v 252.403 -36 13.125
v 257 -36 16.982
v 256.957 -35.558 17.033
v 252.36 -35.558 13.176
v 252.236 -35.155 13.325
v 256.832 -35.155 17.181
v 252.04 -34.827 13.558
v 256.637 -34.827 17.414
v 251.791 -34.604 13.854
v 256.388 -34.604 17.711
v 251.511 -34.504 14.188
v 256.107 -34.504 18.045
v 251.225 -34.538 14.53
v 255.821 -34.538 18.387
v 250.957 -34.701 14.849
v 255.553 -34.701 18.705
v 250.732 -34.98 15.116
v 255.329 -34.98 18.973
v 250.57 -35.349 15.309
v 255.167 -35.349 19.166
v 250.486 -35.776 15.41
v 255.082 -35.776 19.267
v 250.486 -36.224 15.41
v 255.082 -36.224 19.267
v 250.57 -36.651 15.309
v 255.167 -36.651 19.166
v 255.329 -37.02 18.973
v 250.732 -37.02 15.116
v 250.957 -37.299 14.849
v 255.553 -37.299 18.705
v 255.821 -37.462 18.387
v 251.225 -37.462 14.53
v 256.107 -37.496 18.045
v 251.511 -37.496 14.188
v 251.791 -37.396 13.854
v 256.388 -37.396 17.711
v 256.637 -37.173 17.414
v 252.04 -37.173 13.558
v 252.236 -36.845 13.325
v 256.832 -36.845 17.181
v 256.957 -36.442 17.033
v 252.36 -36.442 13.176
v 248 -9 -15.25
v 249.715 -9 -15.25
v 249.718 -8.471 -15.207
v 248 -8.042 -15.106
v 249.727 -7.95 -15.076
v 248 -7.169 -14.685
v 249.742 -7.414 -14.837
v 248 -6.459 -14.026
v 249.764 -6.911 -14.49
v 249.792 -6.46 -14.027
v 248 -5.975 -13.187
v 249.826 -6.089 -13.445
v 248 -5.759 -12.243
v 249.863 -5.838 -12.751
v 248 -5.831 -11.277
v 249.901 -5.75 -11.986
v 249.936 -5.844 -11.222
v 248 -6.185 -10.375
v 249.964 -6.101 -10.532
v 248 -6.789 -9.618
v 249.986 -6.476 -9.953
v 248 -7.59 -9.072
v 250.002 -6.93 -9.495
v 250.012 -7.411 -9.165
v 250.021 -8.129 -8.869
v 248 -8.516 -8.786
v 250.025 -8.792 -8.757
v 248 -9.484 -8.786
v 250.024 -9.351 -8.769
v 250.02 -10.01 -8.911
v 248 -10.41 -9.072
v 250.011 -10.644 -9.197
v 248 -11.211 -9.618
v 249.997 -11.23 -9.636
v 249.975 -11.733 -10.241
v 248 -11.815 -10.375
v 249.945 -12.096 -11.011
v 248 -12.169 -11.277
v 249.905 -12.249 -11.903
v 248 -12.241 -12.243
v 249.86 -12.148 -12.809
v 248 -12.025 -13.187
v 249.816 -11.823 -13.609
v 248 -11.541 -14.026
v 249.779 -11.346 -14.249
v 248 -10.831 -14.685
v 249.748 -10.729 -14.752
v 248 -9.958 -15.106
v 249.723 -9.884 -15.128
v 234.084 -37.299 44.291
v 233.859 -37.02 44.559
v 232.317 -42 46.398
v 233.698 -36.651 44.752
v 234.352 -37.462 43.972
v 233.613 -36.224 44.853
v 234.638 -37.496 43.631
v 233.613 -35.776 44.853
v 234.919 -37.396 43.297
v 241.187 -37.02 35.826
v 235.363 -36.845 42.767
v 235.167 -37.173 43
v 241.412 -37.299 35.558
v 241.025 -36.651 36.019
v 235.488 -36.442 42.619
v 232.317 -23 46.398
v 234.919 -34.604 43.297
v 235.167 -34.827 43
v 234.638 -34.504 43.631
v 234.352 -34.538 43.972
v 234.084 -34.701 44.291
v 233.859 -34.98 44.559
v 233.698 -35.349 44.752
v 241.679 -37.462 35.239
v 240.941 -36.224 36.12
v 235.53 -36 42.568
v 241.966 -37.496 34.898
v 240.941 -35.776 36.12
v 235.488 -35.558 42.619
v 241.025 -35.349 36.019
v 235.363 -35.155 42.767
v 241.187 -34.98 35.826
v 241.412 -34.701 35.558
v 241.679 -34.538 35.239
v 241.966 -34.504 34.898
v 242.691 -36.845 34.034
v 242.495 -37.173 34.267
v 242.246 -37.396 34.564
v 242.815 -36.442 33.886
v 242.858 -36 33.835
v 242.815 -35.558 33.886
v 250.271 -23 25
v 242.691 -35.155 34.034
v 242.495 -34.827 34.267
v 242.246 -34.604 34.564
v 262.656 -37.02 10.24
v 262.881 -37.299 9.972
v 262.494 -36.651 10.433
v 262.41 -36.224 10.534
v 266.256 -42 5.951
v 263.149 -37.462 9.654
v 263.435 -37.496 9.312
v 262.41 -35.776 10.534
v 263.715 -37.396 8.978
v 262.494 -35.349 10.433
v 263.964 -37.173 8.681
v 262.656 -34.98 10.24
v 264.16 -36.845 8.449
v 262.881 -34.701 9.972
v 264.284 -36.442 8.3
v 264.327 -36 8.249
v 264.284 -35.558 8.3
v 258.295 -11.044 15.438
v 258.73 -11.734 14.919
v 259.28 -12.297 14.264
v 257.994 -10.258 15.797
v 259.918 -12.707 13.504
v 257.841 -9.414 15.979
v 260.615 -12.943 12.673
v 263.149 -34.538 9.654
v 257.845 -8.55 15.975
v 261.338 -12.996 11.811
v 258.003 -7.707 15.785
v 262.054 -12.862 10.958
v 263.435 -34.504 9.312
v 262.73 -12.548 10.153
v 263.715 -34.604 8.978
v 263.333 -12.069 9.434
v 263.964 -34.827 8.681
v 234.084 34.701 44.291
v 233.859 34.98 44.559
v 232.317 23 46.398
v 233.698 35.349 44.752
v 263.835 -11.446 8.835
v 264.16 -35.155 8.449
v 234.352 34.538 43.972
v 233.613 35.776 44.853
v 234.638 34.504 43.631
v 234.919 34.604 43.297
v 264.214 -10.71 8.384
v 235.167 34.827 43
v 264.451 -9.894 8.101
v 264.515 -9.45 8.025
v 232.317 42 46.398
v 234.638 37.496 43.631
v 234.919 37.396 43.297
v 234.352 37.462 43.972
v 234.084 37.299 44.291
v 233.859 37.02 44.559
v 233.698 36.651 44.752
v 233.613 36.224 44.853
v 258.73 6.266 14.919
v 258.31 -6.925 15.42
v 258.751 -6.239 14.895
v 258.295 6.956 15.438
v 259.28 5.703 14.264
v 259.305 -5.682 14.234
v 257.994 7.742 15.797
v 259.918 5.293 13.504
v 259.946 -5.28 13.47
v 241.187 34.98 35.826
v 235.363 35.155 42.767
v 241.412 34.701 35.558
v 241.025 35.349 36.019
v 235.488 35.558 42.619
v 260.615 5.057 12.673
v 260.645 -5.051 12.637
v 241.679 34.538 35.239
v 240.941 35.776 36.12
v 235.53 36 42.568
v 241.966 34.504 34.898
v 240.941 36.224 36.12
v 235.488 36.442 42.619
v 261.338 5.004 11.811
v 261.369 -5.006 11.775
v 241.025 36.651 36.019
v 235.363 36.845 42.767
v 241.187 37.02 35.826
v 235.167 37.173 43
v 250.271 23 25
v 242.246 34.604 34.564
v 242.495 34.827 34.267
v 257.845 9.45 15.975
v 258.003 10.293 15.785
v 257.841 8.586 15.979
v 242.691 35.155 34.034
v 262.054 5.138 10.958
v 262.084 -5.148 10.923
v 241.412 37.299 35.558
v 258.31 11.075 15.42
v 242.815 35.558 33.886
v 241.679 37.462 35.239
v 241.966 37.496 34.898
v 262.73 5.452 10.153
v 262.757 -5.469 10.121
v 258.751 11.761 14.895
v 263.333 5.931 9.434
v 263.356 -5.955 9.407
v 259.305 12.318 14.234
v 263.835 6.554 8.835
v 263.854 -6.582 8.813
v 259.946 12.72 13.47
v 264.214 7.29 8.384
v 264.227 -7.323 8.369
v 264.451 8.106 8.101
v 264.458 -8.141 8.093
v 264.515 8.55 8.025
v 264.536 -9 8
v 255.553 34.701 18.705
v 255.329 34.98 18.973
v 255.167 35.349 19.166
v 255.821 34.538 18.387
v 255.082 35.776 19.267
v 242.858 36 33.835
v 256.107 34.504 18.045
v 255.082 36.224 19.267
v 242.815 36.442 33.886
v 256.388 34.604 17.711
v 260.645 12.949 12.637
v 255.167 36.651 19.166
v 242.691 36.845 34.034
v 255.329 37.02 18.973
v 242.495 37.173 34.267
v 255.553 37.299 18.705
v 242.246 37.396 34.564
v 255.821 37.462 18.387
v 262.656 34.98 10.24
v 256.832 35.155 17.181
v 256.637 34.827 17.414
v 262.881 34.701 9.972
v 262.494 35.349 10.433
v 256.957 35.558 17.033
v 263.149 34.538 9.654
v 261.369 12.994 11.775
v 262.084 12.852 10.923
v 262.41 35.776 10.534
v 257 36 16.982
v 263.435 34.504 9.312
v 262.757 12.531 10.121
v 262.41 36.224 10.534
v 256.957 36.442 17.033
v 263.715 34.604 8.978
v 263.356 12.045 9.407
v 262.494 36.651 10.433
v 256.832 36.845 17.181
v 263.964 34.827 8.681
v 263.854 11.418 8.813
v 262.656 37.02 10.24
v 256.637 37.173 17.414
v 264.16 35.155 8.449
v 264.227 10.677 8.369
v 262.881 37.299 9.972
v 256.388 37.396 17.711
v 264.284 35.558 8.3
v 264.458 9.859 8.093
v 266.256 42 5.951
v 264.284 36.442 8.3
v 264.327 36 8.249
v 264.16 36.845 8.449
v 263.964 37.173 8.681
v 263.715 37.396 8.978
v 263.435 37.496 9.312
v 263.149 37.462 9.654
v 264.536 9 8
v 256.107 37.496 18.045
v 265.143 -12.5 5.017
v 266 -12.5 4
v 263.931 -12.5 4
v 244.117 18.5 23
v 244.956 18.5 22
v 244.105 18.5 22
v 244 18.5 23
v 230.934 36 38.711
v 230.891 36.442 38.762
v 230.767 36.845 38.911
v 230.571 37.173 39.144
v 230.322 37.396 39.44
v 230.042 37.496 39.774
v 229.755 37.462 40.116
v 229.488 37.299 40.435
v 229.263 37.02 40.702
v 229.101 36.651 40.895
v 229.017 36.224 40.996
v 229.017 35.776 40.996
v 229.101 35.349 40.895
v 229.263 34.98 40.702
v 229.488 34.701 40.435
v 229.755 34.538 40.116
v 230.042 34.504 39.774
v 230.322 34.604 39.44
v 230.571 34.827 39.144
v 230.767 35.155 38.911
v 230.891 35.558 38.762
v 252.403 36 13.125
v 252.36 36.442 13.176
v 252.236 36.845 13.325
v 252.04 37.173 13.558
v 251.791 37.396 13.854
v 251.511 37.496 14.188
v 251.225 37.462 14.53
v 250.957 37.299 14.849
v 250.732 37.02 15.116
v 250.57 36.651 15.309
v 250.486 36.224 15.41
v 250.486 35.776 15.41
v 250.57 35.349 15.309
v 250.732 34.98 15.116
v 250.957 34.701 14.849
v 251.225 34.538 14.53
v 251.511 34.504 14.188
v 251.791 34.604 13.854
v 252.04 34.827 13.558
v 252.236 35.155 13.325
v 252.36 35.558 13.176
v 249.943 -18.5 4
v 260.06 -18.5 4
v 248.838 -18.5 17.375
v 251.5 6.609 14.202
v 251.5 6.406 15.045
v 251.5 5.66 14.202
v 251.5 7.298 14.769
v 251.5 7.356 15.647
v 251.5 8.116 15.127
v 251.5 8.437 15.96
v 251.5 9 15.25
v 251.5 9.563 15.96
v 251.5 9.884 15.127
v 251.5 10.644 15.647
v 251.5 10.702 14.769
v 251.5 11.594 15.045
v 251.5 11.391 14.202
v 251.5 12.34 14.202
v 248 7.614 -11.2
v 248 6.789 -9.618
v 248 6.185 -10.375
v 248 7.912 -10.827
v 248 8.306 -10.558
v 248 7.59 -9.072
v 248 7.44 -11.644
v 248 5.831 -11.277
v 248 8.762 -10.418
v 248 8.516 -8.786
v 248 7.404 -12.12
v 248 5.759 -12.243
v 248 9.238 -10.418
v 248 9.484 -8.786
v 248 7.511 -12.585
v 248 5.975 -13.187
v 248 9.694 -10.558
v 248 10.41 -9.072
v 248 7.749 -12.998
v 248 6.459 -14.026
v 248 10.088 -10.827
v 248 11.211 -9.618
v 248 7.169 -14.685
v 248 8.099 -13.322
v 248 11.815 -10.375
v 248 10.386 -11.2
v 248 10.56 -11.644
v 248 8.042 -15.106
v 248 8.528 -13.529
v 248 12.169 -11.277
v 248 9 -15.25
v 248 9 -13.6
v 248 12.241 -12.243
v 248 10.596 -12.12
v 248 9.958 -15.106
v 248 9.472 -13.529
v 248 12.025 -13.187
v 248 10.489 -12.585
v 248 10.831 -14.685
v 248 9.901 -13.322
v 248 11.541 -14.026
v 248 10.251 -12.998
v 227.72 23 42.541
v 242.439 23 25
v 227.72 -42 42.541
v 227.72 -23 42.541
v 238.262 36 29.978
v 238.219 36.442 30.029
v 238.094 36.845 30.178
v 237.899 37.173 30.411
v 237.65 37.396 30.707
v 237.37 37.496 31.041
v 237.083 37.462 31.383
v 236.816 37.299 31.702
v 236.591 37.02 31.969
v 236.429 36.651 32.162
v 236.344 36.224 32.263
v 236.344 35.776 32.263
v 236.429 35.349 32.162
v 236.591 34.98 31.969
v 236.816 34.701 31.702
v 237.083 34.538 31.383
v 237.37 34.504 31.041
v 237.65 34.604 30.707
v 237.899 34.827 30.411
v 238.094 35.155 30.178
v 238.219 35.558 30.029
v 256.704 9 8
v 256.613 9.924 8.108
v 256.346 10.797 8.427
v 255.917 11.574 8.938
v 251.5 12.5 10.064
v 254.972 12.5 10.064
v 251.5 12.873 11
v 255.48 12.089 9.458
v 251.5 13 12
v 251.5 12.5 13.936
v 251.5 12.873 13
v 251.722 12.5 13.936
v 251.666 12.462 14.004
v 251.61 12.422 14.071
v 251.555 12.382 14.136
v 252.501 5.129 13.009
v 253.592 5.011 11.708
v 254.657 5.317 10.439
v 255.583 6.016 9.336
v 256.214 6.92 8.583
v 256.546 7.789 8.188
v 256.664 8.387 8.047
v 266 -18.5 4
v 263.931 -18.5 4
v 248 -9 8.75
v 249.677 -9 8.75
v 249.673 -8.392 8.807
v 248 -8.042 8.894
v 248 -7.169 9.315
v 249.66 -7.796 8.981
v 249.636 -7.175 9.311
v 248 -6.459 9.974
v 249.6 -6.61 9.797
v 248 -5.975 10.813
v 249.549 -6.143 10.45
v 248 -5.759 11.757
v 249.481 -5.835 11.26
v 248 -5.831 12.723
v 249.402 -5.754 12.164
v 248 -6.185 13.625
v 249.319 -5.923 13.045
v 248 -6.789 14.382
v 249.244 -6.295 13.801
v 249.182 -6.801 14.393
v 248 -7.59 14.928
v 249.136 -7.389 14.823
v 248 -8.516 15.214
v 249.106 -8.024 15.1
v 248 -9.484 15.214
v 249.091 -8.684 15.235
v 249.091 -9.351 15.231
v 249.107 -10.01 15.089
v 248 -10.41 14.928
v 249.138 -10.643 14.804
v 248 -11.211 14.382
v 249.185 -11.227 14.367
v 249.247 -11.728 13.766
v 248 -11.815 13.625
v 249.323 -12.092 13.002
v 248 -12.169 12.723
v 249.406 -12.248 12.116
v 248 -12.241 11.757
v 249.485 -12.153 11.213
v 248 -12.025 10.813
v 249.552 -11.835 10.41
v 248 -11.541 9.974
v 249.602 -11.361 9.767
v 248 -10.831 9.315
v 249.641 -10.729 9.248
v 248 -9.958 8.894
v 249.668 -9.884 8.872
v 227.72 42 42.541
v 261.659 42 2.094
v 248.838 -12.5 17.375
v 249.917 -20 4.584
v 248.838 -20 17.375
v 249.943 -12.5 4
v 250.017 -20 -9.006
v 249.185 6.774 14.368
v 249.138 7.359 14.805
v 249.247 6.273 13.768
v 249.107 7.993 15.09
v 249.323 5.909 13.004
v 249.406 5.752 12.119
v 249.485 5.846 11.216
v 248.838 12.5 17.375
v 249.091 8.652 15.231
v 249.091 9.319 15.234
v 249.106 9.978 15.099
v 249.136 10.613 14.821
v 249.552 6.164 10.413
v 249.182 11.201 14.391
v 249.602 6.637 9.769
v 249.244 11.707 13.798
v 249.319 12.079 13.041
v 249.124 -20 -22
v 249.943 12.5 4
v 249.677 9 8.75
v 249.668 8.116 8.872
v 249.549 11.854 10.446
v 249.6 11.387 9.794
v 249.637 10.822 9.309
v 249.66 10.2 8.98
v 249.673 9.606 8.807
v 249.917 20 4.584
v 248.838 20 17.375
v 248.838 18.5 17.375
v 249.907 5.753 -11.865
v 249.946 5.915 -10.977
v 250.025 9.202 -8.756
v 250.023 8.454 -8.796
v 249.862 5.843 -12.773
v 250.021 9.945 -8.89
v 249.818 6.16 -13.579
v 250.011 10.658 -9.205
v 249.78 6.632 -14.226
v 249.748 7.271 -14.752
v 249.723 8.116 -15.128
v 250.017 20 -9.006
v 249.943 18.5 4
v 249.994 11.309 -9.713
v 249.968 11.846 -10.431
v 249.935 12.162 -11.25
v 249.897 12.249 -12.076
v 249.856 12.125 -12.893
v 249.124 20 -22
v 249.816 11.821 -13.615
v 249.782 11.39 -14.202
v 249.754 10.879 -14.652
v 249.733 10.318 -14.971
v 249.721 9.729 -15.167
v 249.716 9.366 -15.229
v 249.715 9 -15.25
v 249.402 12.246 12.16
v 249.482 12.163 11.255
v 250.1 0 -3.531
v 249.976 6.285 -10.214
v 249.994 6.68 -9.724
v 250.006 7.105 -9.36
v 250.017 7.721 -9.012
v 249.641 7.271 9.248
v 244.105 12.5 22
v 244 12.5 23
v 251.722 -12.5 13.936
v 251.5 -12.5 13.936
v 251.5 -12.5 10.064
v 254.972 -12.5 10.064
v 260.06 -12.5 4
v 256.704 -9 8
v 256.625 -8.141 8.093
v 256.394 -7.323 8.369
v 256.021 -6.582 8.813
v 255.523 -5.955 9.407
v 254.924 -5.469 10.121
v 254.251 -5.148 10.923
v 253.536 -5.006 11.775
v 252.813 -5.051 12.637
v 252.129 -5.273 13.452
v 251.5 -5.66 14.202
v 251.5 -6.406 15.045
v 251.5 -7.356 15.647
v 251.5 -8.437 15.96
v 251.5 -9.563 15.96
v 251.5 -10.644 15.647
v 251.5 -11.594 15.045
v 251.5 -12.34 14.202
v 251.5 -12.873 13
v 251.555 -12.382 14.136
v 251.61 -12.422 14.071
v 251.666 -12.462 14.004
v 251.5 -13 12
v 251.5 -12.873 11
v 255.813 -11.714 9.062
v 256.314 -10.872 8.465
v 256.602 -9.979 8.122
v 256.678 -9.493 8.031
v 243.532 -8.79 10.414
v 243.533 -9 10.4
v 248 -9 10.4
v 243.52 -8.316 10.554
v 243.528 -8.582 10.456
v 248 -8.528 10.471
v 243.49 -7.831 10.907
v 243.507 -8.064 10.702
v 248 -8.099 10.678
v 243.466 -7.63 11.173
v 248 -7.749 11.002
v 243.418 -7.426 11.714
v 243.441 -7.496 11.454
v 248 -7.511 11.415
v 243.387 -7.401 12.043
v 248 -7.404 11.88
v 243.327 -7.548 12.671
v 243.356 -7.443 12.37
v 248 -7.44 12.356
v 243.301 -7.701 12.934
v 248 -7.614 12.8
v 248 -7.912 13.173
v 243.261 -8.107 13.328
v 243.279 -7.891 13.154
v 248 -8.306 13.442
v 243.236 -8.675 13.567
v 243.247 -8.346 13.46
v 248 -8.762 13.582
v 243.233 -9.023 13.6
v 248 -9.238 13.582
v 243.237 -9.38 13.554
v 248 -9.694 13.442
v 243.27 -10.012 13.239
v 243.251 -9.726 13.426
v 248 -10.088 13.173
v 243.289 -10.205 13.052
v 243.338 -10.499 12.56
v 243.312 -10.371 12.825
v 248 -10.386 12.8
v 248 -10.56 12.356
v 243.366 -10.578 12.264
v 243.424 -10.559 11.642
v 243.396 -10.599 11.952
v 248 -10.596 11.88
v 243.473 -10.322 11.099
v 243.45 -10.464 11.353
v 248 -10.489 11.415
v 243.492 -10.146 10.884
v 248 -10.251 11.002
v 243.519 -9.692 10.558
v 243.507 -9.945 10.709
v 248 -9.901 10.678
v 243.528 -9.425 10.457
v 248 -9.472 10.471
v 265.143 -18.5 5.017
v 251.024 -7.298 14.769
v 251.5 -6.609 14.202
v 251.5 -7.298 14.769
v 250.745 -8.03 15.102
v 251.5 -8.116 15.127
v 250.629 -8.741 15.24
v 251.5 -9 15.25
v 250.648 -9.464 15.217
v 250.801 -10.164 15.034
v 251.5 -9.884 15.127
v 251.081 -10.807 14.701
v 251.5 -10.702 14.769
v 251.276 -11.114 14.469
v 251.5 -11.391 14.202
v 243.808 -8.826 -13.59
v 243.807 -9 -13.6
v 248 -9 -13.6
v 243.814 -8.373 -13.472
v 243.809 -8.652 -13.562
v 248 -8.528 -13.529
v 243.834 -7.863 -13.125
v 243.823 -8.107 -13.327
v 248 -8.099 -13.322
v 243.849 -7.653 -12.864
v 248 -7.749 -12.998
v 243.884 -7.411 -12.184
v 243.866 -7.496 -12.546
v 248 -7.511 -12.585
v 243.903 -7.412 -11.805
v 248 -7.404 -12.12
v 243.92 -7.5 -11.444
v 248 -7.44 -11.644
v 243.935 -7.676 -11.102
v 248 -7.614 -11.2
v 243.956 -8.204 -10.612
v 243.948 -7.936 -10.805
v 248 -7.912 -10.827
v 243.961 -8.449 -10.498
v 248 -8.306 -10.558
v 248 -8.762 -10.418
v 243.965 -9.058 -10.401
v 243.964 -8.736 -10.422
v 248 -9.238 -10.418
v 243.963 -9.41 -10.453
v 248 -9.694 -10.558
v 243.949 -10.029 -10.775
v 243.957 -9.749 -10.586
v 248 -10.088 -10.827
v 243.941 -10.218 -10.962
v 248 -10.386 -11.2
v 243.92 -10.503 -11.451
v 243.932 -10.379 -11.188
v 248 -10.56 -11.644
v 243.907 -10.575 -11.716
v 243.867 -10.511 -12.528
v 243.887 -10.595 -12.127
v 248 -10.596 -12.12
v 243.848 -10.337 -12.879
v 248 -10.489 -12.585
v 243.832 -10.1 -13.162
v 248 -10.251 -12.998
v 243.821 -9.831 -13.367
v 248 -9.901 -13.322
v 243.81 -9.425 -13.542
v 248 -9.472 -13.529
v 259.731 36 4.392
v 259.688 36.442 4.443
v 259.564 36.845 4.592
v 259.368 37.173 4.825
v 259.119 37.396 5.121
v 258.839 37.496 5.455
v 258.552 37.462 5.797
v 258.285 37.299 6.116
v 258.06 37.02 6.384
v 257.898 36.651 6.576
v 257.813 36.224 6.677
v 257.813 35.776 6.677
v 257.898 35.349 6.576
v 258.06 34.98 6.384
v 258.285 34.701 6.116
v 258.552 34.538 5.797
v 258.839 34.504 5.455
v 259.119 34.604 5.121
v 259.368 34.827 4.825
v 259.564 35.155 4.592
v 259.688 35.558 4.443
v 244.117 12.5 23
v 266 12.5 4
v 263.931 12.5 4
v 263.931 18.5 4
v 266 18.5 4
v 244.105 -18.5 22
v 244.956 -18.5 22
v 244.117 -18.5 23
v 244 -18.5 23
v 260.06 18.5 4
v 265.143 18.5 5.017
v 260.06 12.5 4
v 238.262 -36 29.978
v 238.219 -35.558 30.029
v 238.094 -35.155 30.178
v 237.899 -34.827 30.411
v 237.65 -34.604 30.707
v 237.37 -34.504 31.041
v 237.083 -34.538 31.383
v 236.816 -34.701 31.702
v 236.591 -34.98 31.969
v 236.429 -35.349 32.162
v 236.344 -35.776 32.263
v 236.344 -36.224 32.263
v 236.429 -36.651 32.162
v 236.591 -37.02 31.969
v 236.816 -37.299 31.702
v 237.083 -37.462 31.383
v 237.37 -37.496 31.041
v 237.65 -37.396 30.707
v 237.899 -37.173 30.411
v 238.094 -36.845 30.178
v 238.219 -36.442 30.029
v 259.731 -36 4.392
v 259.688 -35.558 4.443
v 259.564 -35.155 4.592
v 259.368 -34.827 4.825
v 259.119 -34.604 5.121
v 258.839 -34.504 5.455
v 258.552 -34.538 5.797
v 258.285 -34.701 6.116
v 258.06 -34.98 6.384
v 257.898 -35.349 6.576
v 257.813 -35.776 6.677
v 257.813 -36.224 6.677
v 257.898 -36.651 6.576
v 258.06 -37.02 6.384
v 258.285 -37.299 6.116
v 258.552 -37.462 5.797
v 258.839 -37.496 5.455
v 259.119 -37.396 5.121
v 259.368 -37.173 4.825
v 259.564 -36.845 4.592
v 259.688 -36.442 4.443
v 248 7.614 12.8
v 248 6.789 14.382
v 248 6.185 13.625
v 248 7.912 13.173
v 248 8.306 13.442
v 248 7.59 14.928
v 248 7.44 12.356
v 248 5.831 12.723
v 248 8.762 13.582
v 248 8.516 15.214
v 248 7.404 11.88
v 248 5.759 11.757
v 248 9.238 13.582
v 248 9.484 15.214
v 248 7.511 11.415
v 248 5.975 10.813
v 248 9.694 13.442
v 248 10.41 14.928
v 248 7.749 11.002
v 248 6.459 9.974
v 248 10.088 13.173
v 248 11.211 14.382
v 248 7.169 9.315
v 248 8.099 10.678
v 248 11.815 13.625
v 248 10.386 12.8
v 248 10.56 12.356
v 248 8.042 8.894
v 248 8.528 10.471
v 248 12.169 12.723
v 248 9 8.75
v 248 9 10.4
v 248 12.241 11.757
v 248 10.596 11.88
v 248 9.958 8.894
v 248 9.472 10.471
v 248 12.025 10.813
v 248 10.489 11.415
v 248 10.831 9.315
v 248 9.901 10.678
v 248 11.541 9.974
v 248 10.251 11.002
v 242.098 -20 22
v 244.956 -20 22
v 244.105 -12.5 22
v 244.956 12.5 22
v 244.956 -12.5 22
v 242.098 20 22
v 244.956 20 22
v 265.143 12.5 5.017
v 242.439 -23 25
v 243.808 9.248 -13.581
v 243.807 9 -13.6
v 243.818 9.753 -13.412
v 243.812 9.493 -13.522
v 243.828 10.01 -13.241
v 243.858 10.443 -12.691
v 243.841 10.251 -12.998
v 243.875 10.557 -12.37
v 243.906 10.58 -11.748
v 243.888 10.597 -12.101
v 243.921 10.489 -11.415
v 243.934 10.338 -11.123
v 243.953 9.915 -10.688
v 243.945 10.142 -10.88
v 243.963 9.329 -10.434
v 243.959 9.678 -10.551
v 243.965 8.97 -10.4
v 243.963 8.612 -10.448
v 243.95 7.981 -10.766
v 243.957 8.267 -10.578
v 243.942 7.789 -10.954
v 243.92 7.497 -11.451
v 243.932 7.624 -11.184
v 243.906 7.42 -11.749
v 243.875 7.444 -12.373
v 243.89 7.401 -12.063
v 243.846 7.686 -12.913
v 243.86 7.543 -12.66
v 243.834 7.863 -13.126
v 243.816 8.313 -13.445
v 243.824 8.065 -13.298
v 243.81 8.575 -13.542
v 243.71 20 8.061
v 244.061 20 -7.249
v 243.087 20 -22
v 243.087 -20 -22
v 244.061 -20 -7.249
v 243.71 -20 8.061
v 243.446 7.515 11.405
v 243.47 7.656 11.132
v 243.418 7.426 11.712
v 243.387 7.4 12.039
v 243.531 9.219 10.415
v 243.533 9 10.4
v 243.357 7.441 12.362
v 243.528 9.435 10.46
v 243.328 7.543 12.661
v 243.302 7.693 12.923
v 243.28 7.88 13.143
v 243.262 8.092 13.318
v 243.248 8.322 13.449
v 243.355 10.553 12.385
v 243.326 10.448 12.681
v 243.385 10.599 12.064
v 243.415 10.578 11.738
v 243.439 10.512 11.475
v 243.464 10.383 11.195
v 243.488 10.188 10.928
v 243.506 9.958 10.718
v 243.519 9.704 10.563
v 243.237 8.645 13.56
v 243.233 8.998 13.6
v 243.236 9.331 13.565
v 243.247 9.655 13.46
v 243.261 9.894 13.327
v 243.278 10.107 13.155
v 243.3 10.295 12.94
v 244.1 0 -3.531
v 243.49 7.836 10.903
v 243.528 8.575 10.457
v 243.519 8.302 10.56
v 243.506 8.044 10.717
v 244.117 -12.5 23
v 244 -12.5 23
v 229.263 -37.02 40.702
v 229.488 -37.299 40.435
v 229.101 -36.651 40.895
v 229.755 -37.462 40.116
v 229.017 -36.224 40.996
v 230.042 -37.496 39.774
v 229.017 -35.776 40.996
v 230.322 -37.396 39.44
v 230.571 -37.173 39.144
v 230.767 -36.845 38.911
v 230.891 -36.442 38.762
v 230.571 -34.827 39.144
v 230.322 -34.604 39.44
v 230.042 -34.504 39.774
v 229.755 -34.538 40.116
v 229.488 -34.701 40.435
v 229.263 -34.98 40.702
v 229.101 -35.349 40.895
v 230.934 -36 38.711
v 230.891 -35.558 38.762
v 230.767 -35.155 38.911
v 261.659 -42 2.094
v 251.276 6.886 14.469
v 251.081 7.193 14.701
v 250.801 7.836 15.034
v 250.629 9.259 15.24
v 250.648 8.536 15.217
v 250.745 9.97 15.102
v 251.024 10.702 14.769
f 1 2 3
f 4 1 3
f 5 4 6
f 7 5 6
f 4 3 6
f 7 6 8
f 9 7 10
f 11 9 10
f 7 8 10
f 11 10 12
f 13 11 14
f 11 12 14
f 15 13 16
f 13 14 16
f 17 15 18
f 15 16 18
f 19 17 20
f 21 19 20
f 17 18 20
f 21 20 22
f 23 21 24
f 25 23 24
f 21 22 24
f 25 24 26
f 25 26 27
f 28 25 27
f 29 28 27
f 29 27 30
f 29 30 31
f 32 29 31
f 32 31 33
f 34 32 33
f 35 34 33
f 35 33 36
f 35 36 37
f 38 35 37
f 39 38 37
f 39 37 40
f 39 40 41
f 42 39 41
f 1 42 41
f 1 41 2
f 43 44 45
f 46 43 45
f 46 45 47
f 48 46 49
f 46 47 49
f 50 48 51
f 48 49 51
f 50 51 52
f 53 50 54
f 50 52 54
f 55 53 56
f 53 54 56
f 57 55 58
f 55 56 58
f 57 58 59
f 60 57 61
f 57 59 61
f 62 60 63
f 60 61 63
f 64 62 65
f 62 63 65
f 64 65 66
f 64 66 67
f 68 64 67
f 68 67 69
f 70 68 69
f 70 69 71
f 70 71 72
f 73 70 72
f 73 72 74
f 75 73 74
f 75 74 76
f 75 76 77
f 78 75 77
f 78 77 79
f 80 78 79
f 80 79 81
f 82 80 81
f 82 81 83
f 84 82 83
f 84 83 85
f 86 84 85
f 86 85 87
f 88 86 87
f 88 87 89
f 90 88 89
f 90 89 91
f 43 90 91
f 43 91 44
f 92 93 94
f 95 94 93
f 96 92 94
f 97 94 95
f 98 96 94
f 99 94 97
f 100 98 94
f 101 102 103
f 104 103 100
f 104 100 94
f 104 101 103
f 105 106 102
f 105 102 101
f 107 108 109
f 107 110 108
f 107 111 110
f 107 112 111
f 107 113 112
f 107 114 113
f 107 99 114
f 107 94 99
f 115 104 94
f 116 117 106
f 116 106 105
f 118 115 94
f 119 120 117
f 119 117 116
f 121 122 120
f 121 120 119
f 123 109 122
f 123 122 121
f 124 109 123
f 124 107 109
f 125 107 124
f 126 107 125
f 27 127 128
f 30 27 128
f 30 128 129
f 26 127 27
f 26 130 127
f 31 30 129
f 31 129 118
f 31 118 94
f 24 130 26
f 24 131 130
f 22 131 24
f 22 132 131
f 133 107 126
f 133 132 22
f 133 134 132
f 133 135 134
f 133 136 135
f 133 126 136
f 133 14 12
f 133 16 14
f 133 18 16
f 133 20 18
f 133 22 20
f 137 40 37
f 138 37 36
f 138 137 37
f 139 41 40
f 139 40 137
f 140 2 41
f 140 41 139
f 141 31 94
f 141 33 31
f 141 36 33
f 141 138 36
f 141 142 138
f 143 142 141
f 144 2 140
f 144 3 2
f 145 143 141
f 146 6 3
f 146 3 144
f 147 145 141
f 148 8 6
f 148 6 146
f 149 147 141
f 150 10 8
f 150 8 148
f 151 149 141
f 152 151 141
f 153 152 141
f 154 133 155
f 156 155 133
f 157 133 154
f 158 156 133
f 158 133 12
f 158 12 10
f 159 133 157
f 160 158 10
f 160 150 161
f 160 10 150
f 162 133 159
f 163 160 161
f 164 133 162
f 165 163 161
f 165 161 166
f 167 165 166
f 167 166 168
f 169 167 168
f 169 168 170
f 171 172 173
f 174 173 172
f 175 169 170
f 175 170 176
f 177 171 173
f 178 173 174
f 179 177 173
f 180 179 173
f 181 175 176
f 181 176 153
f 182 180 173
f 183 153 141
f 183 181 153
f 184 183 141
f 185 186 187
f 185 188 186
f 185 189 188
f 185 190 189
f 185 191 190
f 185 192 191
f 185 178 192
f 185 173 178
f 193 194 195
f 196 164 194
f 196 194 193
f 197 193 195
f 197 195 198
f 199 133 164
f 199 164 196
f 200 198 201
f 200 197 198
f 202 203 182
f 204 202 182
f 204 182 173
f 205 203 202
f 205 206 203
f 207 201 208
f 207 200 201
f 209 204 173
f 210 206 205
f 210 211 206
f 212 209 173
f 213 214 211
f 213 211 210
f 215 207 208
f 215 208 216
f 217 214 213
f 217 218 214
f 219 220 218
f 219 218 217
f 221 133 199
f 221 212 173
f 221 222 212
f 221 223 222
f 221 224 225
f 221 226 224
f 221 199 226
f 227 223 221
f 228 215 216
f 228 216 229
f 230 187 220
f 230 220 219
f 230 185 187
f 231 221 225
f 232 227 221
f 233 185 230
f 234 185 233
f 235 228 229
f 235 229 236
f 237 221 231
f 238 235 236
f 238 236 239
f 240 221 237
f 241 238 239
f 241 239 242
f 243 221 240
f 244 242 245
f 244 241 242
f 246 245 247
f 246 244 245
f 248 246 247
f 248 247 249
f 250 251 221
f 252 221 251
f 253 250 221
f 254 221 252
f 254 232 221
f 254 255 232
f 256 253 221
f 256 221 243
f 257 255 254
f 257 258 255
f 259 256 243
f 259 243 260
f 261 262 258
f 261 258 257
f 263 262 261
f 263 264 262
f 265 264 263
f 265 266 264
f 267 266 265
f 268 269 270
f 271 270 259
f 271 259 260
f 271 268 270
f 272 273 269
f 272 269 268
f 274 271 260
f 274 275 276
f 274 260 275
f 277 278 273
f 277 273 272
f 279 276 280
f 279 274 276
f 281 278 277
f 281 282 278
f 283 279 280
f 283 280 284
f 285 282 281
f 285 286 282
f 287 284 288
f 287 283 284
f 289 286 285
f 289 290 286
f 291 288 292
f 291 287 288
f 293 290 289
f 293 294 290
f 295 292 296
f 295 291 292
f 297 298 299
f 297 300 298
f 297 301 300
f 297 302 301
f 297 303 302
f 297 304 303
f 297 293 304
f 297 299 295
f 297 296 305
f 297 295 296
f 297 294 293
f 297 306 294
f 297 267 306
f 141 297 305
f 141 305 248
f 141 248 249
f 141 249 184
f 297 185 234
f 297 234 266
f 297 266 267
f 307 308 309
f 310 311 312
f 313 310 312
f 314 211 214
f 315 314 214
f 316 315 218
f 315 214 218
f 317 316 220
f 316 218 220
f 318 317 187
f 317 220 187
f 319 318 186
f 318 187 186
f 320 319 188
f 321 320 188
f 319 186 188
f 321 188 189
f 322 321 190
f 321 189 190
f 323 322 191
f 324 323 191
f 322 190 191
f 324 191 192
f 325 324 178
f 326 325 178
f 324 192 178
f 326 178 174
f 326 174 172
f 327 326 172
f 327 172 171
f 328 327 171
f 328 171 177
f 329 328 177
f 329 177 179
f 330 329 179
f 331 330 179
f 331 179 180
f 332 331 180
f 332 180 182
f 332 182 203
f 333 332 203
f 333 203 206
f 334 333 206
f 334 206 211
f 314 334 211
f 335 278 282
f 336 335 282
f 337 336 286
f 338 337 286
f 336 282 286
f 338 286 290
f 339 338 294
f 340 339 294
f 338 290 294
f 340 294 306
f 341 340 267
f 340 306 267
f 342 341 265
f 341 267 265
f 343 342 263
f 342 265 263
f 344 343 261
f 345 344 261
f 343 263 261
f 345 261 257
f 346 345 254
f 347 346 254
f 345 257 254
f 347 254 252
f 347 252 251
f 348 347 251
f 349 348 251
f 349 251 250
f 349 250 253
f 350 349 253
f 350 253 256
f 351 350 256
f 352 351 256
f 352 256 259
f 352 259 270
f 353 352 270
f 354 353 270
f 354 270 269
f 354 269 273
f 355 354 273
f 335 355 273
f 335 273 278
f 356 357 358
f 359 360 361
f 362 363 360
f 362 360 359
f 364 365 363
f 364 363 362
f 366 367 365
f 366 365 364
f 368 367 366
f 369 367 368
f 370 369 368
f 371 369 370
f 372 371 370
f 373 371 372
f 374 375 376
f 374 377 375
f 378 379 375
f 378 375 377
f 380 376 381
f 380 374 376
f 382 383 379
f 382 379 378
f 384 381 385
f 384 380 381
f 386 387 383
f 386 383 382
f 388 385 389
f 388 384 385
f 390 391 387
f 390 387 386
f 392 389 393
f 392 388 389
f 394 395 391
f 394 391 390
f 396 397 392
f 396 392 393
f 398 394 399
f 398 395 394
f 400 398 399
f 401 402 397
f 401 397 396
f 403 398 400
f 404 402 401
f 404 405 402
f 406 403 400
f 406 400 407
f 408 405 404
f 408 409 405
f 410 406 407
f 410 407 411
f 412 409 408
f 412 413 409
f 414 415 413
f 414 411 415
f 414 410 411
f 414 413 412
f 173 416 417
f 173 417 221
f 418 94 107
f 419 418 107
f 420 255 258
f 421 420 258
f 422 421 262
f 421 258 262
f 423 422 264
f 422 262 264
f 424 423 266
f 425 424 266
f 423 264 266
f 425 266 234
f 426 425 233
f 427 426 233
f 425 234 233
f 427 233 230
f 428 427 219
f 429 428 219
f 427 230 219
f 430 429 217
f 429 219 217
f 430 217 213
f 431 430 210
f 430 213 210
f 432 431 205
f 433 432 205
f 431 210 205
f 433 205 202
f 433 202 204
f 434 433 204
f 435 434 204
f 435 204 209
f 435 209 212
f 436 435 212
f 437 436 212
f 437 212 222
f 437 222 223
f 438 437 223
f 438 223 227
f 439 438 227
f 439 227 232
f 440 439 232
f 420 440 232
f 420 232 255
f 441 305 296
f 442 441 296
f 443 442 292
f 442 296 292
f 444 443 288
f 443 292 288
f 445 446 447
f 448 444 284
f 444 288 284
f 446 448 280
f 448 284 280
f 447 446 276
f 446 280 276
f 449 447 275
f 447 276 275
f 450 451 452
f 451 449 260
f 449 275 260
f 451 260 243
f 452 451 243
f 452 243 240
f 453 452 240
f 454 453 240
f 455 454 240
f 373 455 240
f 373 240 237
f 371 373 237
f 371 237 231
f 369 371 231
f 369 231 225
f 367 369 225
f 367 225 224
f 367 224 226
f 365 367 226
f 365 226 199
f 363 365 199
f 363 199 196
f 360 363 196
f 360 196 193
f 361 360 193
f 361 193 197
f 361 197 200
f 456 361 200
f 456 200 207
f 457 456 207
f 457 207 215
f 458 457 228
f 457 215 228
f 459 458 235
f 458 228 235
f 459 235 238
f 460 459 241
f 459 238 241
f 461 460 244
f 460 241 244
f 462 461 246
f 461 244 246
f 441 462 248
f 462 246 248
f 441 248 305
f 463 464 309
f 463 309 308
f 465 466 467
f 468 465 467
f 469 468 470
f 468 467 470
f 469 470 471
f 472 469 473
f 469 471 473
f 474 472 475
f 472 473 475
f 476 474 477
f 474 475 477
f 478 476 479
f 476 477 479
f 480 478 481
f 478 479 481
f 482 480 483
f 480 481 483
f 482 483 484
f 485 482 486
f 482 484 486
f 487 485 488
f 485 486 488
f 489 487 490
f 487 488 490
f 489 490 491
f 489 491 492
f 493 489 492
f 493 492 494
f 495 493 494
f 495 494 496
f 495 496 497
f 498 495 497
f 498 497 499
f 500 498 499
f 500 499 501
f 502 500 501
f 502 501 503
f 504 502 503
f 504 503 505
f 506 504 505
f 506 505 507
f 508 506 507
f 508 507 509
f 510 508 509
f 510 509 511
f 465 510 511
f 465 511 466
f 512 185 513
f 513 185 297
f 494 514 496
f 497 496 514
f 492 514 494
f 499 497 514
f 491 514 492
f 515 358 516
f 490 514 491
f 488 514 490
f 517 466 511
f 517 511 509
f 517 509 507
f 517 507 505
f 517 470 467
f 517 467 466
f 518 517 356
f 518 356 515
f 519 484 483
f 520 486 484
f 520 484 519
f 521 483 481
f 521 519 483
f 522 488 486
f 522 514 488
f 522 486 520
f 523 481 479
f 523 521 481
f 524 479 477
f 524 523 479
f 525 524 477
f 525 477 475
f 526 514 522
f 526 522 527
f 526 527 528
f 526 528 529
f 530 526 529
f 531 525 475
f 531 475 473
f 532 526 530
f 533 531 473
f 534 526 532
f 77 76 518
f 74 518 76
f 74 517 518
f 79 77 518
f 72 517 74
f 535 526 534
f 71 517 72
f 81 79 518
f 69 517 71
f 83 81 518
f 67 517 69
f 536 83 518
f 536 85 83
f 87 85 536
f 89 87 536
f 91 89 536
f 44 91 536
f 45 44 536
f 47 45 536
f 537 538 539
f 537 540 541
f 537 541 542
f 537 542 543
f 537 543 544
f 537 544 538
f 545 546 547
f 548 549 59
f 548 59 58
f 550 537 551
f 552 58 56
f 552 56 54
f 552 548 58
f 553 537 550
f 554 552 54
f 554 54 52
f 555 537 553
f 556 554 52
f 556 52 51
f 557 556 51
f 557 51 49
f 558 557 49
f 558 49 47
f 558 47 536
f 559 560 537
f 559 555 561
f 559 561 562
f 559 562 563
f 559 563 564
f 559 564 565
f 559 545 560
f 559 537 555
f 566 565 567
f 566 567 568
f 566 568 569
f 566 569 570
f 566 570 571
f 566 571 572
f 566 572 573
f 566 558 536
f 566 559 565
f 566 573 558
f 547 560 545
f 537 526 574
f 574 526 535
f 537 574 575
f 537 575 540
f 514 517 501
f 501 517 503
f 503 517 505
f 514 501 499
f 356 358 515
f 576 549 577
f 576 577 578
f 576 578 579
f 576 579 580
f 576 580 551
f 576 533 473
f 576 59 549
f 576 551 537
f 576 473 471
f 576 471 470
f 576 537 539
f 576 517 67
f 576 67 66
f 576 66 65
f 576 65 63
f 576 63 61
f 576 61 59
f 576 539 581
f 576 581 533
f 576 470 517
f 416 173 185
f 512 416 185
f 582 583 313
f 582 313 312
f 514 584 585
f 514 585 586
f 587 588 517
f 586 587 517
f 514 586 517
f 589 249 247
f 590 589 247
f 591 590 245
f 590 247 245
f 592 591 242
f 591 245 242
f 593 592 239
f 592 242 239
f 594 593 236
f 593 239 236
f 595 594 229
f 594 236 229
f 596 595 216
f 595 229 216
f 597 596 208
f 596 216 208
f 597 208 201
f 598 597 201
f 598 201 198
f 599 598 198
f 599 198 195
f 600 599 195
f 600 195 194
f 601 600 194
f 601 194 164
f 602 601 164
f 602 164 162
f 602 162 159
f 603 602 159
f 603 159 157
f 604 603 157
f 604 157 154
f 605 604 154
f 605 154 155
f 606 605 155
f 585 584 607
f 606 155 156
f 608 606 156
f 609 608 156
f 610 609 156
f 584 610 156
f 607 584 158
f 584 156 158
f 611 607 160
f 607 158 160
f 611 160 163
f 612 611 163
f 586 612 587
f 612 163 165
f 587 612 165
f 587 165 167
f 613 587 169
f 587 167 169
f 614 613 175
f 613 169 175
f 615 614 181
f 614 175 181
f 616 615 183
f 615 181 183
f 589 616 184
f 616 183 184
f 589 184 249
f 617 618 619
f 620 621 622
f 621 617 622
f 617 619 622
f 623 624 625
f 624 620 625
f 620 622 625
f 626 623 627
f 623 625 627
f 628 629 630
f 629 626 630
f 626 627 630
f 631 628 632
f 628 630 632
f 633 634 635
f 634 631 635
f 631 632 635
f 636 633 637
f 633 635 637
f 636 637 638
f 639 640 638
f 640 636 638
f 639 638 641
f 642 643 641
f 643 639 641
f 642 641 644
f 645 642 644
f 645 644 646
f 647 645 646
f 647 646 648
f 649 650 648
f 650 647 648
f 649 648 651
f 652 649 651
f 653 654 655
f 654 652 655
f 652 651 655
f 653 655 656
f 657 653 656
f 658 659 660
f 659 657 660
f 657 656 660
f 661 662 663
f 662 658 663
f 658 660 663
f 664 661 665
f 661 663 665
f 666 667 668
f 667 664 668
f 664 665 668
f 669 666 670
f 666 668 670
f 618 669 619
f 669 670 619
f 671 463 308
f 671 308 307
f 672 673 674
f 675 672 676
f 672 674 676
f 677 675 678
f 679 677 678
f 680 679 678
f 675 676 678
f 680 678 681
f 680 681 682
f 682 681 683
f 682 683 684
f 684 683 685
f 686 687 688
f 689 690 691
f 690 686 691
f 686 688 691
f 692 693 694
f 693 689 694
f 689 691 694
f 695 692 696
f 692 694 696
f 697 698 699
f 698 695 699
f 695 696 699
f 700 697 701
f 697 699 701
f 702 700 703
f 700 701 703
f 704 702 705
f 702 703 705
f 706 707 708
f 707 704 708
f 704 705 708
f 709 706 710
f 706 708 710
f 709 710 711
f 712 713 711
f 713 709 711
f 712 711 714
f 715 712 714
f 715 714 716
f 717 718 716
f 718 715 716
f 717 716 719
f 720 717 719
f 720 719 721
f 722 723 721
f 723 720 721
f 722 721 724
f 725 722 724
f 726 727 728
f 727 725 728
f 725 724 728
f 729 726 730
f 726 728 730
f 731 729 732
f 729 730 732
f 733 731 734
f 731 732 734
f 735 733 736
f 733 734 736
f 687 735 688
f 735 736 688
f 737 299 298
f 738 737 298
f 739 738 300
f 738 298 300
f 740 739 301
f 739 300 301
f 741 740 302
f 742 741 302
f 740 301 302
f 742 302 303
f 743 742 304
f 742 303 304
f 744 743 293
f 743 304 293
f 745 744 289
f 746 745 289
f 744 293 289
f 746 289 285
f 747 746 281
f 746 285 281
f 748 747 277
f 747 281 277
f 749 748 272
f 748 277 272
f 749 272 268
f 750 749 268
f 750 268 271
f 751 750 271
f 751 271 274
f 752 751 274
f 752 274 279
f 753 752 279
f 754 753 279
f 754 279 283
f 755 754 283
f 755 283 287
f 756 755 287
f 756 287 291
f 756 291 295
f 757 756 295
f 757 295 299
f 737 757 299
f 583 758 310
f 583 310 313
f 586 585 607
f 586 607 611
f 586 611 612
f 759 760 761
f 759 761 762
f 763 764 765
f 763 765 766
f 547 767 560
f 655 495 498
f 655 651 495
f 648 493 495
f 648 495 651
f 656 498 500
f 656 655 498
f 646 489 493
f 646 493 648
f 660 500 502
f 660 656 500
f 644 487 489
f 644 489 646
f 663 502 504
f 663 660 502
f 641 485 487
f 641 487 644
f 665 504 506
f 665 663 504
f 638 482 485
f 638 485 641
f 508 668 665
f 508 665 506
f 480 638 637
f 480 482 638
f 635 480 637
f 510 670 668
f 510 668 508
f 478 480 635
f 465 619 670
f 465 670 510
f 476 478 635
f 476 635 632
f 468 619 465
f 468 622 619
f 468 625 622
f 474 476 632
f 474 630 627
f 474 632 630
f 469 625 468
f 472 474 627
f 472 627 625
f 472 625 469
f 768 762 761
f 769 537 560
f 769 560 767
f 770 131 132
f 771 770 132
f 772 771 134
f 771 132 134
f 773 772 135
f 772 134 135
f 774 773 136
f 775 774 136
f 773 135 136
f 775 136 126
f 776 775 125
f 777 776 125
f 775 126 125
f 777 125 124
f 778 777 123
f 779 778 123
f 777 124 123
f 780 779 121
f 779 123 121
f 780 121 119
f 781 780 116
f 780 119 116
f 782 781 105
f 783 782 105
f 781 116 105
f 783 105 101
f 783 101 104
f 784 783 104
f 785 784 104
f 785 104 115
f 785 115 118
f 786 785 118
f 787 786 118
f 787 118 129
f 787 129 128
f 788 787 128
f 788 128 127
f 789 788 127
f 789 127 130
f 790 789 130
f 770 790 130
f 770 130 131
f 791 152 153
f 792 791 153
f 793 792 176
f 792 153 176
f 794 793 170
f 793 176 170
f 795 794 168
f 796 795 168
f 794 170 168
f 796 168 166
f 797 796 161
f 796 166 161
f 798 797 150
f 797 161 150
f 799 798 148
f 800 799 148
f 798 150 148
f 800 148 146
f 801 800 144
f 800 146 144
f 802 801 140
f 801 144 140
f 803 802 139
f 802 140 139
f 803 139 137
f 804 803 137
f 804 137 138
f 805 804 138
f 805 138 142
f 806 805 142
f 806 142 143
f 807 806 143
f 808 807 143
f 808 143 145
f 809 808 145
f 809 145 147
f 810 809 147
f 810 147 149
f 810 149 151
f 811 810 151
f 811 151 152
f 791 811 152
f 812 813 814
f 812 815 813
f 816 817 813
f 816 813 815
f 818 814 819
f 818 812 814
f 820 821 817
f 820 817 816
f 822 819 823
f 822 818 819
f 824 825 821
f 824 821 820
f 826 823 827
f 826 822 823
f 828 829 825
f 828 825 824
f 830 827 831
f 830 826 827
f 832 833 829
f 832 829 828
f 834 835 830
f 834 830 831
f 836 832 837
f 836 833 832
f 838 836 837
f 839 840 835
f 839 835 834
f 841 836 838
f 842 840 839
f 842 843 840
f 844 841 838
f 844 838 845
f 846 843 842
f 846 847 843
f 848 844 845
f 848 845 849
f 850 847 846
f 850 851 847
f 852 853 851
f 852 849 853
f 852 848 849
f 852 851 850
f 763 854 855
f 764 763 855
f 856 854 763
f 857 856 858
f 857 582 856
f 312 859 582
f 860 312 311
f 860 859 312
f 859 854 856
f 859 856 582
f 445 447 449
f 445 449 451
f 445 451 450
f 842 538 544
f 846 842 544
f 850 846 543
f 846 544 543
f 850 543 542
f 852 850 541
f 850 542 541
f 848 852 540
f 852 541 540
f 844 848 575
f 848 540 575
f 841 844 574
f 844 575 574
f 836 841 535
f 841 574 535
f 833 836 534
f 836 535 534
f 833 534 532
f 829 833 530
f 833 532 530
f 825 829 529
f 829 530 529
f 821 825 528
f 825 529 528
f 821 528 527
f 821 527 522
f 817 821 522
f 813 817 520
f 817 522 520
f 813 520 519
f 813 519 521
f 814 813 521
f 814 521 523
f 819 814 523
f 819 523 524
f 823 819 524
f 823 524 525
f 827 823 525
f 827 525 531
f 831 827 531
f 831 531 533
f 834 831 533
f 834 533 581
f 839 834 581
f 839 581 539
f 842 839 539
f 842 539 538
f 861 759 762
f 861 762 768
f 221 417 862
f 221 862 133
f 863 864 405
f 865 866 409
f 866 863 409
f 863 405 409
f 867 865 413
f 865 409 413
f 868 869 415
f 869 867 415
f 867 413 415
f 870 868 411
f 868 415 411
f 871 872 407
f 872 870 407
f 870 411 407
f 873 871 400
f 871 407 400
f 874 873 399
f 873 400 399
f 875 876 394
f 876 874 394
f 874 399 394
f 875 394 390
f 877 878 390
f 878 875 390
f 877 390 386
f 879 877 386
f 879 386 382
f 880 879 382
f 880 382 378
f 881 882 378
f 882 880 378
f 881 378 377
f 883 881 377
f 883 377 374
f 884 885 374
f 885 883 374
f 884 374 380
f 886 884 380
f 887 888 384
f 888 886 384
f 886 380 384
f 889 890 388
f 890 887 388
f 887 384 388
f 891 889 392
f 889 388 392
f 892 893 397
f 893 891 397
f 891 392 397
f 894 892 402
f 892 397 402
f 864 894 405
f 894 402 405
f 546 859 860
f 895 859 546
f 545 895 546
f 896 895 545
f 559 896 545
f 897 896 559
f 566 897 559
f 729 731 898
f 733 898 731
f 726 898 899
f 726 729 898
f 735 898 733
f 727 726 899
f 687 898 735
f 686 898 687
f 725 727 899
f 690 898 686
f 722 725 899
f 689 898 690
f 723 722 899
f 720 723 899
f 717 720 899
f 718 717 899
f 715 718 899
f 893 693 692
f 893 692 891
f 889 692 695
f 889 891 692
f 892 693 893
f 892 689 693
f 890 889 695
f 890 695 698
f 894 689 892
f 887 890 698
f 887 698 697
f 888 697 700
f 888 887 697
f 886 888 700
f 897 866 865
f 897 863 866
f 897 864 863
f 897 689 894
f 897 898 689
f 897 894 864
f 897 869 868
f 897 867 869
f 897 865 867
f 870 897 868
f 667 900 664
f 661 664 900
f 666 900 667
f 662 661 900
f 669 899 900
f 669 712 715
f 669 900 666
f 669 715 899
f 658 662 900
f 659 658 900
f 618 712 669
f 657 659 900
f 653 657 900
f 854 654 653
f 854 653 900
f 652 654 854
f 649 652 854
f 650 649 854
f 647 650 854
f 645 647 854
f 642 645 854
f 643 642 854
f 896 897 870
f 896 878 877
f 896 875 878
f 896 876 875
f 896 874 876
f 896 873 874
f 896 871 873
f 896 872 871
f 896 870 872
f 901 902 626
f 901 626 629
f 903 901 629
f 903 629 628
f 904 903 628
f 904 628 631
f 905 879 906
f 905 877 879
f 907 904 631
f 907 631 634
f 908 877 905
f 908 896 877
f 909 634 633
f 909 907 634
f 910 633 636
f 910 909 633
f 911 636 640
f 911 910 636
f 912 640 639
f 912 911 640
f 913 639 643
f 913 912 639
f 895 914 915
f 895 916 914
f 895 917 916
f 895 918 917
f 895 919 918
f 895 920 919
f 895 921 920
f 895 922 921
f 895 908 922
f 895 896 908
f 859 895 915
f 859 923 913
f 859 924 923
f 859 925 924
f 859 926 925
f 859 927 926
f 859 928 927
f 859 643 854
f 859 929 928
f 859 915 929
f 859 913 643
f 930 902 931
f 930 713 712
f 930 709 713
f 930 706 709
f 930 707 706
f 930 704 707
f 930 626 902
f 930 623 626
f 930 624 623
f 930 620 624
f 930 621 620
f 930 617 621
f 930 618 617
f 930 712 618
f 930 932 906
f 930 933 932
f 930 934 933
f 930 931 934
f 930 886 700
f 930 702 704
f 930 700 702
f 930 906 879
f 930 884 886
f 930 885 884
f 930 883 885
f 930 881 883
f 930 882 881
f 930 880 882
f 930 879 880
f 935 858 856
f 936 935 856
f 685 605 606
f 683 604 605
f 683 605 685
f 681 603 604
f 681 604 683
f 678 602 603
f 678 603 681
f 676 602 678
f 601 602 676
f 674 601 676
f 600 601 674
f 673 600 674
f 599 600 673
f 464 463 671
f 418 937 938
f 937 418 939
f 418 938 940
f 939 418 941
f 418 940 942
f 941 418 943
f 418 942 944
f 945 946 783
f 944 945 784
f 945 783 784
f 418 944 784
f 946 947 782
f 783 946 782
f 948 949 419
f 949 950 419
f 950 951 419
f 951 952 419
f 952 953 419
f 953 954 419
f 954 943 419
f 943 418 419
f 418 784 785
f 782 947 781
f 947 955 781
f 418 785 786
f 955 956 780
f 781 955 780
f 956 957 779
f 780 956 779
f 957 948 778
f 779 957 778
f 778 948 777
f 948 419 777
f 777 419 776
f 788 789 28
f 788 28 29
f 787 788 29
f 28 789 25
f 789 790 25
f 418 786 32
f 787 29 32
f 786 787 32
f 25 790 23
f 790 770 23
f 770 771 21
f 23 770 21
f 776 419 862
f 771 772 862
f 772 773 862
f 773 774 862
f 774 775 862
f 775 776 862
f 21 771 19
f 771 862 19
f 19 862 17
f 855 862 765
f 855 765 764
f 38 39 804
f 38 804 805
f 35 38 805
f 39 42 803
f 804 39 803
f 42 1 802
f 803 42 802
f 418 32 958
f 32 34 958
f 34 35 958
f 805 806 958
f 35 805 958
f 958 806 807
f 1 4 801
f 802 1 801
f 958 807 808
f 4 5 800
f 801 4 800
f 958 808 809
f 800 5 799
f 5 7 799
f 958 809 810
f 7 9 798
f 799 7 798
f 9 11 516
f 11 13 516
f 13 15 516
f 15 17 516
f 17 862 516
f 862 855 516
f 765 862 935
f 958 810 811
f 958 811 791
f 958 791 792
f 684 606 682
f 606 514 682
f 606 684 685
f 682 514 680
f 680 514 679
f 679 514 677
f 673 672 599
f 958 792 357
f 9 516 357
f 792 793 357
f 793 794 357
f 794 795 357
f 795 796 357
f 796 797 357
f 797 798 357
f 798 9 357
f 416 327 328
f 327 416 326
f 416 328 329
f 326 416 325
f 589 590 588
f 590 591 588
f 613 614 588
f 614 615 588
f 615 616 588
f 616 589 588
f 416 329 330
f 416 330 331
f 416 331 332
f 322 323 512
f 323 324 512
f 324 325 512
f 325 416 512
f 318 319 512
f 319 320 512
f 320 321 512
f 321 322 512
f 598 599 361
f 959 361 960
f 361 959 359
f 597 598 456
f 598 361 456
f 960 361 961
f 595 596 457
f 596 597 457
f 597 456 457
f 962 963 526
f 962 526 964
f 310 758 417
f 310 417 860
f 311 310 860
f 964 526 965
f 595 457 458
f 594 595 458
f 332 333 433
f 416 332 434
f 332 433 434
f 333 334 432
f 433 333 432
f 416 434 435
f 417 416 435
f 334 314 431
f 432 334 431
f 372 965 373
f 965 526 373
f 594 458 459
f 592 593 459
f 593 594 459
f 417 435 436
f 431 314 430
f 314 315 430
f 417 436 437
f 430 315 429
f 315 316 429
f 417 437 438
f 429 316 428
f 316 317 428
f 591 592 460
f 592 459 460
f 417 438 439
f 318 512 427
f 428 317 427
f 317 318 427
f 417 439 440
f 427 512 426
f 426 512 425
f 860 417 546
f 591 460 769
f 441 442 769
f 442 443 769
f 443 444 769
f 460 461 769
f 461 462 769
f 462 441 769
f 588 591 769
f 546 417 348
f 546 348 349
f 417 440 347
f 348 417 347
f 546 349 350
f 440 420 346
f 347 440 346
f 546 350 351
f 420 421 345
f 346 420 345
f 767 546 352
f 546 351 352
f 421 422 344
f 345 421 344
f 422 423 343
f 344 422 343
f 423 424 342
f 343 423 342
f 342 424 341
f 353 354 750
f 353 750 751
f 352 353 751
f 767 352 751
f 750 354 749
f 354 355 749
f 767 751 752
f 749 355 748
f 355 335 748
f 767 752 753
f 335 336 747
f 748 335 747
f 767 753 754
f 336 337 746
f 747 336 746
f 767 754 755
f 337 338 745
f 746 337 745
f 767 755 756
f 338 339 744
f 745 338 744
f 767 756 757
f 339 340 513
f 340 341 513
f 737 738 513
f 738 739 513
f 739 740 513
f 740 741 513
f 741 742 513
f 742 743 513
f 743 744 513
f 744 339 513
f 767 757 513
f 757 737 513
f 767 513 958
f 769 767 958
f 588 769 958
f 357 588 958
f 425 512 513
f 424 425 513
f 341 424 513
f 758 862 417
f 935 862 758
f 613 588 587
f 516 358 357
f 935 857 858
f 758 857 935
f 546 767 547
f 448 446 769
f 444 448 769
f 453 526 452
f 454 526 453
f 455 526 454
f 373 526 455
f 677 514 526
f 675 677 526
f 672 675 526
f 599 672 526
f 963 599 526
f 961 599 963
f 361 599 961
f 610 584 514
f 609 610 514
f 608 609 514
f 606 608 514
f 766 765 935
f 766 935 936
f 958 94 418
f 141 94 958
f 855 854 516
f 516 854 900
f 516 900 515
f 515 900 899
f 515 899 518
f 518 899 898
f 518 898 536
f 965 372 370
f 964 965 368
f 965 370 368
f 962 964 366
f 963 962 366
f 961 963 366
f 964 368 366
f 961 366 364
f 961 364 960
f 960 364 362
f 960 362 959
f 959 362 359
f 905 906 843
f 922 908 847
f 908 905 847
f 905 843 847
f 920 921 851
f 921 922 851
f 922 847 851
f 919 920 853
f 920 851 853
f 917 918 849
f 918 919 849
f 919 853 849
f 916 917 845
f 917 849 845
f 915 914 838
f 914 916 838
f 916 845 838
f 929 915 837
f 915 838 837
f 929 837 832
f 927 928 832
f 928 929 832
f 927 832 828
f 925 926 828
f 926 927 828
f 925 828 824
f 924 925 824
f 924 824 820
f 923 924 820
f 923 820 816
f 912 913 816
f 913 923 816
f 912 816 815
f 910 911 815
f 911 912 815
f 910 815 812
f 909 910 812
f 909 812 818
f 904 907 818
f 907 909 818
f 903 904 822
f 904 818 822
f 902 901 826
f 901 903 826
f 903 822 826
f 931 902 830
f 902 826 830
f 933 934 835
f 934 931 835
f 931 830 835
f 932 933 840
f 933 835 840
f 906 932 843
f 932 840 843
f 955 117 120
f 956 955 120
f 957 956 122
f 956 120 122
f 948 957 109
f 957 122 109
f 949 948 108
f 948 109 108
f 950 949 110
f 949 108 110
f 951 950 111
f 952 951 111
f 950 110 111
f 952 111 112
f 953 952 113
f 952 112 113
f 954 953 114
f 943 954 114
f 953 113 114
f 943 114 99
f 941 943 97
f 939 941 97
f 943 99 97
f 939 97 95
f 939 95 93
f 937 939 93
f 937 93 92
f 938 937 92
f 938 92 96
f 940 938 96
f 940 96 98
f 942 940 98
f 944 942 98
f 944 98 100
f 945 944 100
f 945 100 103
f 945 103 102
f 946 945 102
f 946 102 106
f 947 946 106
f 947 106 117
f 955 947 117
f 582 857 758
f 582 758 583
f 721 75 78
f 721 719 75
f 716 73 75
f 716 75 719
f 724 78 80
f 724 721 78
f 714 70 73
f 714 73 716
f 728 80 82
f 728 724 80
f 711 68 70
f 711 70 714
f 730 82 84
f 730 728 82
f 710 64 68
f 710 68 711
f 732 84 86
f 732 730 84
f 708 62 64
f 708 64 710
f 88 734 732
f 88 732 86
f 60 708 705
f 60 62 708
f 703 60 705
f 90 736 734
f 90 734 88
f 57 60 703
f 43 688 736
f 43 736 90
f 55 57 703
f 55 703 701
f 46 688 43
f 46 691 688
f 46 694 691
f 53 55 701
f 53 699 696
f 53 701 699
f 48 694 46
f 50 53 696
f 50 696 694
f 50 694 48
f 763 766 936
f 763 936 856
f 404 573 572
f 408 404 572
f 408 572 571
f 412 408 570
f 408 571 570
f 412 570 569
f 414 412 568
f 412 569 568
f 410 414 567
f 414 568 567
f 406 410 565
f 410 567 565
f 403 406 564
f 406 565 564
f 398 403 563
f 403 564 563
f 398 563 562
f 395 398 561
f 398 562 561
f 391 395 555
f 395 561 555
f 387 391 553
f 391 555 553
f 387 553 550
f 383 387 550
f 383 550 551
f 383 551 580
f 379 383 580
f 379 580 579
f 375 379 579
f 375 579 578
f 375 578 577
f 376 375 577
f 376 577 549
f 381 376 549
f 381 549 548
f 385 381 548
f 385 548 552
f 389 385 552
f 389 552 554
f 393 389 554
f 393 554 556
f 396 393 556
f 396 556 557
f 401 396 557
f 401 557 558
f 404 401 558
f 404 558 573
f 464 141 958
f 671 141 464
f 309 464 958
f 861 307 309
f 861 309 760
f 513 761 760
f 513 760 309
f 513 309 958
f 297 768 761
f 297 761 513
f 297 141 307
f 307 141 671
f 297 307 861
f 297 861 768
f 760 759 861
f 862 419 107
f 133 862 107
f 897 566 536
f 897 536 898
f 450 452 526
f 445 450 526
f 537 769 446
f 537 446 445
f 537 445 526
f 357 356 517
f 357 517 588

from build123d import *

# Parameters (mm, degrees)
SKETCH_1_W          = 52.8
SKETCH_1_H          = 84
EXTRUDE_1_DEPTH     = 6
SKETCH_2_R          = 1.5
CUT_EXTRUDE_1_DEPTH = 8
SKETCH_3_W          = 60
SKETCH_3_H          = 46
CUT_EXTRUDE_2_DEPTH = 50
EXTRUDE_2_DEPTH     = 40
EXTRUDE_3_DEPTH     = 6
EXTRUDE_4_DEPTH     = 6
SKETCH_7_R          = 1.6
CUT_EXTRUDE_3_DEPTH = 70
SKETCH_8_R          = 3.25
CUT_EXTRUDE_4_DEPTH = 12
SKETCH_9_R          = 4
CUT_EXTRUDE_5_DEPTH = 23.5


with BuildPart() as part:
    # 草图1 → 凸台-拉伸1 (new body)
    with BuildSketch(Plane(origin=(159.175409567, 0, 133.564027461), x_dir=(0.6427876096867067, 0, -0.7660444431188377), z_dir=(0.7660444431188378, 0, 0.6427876096867067))):
        with Locations((140.187338197, 0)):
            Rectangle(SKETCH_1_W, SKETCH_1_H)
    extrude(amount=-EXTRUDE_1_DEPTH)

    # 草图2 → 切除-拉伸1 (cut)
    with BuildSketch(Plane(origin=(159.175409567, 0, 133.564027461), x_dir=(0.6427876096867067, 0, -0.7660444431188377), z_dir=(0.7660444431188378, 0, 0.6427876096867067))):
        with Locations((117.287338197, -36)):
            Circle(SKETCH_2_R)
        with Locations((117.287338197, 36)):
            Circle(SKETCH_2_R)
        with Locations((150.687338197, 36)):
            Circle(SKETCH_2_R)
        with Locations((128.687338197, 36)):
            Circle(SKETCH_2_R)
        with Locations((128.687338197, -36)):
            Circle(SKETCH_2_R)
        with Locations((162.087338197, 36)):
            Circle(SKETCH_2_R)
        with Locations((162.087338197, -36)):
            Circle(SKETCH_2_R)
        with Locations((150.687338197, -36)):
            Circle(SKETCH_2_R)
    extrude(amount=-CUT_EXTRUDE_1_DEPTH, mode=Mode.SUBTRACT)

    # 草图3 → 切除-拉伸2 (cut)
    with BuildSketch(Plane.XY.offset(25)):
        with Locations((250, 0)):
            Rectangle(SKETCH_3_W, SKETCH_3_H)
    extrude(amount=CUT_EXTRUDE_2_DEPTH, mode=Mode.SUBTRACT)

    # 草图4 → 凸台-拉伸2 (add)
    with BuildSketch(Plane(origin=(0, 20, 0), x_dir=(-1, 0, 0), z_dir=(0, -1, 0))):
        with BuildLine():
            Line((-249.1237949, 22), (-243.086632908, 22))
            add(Edge.make_bspline(
                [(-243.086632908, 22), (-243.481254737, 18.531426174), (-243.784948463, 14.933770973), (-243.993041019, 11.223078881), (-244.1, 7.416444076), (-244.1, 3.53121788)],
                knots=[0.778865295, 0.778865295, 0.778865295, 0.778865295, 0.778865295, 0.778865295, 1, 1, 1, 1, 1, 1], degree=5))
            add(Edge.make_bspline(
                [(-244.1, 3.53121788), (-244.1, -1.069863619), (-243.955995612, -5.56513348), (-243.676385618, -9.929661799), (-243.268946043, -14.139045721), (-242.741071446, -18.169549128), (-242.097814731, -22)],
                knots=[0, 0, 0, 0, 0, 0, 0, 0.314254692, 0.314254692, 0.314254692, 0.314254692, 0.314254692, 0.314254692, 0.314254692], degree=6))
            Line((-242.097814731, -22), (-248.177885229, -22))
            add(Edge.make_bspline(
                [(-248.177885229, -22), (-248.800145217, -18.111595668), (-249.307087627, -14.054845034), (-249.696626763, -9.84368942), (-249.96306742, -5.496084567), (-250.1, -1.031127344), (-250.1, 3.53121788)],
                knots=[0.698640687, 0.698640687, 0.698640687, 0.698640687, 0.698640687, 0.698640687, 0.698640687, 1, 1, 1, 1, 1, 1, 1], degree=6))
            add(Edge.make_bspline(
                [(-250.1, 3.53121788), (-250.1, 7.398092065), (-249.997534101, 11.192091342), (-249.797793696, 14.899179655), (-249.505456591, 18.505771646), (-249.1237949, 22)],
                knots=[0, 0, 0, 0, 0, 0, 0.212850791, 0.212850791, 0.212850791, 0.212850791, 0.212850791, 0.212850791], degree=5))
        make_face()
    extrude(amount=EXTRUDE_2_DEPTH)

    # 草图5 → 凸台-拉伸3 (add)
    with BuildSketch(Plane(origin=(0, -18.5, 0), x_dir=(-1, 0, 0), z_dir=(0, -1, 0))):
        Polygon((-246, -4), (-266, -4), (-250, -23), (-244, -23), align=None)
    extrude(amount=-EXTRUDE_3_DEPTH)

    # 草图6 → 凸台-拉伸4 (add)
    with BuildSketch(Plane(origin=(0, 12.5, 0), x_dir=(-1, 0, 0), z_dir=(0, -1, 0))):
        Polygon((-246, -4), (-266, -4), (-250, -23), (-244, -23), align=None)
    extrude(amount=-EXTRUDE_4_DEPTH)

    # 草图7 → 切除-拉伸3 (cut)
    with BuildSketch(Plane(origin=(285, 0, 0), x_dir=(0, 0, -1), z_dir=(1, 0, 0))):
        with Locations((12, -9)):
            Circle(SKETCH_7_R)
        with Locations((-12, -9)):
            Circle(SKETCH_7_R)
        with Locations((12, 9)):
            Circle(SKETCH_7_R)
        with Locations((-12, 9)):
            Circle(SKETCH_7_R)
    extrude(amount=-CUT_EXTRUDE_3_DEPTH, mode=Mode.SUBTRACT)

    # 草图8 → 切除-拉伸4 (cut)
    with BuildSketch(Plane(origin=(260, 0, 0), x_dir=(0, 0, -1), z_dir=(1, 0, 0))):
        with Locations((12, -9)):
            Circle(SKETCH_8_R)
        with Locations((-12, -9)):
            Circle(SKETCH_8_R)
        with Locations((12, 9)):
            Circle(SKETCH_8_R)
        with Locations((-12, 9)):
            Circle(SKETCH_8_R)
    extrude(amount=-CUT_EXTRUDE_4_DEPTH, mode=Mode.SUBTRACT)

    # 草图9 → 切除-拉伸5 (cut)
    with BuildSketch(Plane(origin=(275, 0, 0), x_dir=(0, 0, -1), z_dir=(1, 0, 0))):
        with Locations((-12, -9)):
            Circle(SKETCH_9_R)
        with Locations((-12, 9)):
            Circle(SKETCH_9_R)
    extrude(amount=-CUT_EXTRUDE_5_DEPTH, mode=Mode.SUBTRACT)


solid = part.part
